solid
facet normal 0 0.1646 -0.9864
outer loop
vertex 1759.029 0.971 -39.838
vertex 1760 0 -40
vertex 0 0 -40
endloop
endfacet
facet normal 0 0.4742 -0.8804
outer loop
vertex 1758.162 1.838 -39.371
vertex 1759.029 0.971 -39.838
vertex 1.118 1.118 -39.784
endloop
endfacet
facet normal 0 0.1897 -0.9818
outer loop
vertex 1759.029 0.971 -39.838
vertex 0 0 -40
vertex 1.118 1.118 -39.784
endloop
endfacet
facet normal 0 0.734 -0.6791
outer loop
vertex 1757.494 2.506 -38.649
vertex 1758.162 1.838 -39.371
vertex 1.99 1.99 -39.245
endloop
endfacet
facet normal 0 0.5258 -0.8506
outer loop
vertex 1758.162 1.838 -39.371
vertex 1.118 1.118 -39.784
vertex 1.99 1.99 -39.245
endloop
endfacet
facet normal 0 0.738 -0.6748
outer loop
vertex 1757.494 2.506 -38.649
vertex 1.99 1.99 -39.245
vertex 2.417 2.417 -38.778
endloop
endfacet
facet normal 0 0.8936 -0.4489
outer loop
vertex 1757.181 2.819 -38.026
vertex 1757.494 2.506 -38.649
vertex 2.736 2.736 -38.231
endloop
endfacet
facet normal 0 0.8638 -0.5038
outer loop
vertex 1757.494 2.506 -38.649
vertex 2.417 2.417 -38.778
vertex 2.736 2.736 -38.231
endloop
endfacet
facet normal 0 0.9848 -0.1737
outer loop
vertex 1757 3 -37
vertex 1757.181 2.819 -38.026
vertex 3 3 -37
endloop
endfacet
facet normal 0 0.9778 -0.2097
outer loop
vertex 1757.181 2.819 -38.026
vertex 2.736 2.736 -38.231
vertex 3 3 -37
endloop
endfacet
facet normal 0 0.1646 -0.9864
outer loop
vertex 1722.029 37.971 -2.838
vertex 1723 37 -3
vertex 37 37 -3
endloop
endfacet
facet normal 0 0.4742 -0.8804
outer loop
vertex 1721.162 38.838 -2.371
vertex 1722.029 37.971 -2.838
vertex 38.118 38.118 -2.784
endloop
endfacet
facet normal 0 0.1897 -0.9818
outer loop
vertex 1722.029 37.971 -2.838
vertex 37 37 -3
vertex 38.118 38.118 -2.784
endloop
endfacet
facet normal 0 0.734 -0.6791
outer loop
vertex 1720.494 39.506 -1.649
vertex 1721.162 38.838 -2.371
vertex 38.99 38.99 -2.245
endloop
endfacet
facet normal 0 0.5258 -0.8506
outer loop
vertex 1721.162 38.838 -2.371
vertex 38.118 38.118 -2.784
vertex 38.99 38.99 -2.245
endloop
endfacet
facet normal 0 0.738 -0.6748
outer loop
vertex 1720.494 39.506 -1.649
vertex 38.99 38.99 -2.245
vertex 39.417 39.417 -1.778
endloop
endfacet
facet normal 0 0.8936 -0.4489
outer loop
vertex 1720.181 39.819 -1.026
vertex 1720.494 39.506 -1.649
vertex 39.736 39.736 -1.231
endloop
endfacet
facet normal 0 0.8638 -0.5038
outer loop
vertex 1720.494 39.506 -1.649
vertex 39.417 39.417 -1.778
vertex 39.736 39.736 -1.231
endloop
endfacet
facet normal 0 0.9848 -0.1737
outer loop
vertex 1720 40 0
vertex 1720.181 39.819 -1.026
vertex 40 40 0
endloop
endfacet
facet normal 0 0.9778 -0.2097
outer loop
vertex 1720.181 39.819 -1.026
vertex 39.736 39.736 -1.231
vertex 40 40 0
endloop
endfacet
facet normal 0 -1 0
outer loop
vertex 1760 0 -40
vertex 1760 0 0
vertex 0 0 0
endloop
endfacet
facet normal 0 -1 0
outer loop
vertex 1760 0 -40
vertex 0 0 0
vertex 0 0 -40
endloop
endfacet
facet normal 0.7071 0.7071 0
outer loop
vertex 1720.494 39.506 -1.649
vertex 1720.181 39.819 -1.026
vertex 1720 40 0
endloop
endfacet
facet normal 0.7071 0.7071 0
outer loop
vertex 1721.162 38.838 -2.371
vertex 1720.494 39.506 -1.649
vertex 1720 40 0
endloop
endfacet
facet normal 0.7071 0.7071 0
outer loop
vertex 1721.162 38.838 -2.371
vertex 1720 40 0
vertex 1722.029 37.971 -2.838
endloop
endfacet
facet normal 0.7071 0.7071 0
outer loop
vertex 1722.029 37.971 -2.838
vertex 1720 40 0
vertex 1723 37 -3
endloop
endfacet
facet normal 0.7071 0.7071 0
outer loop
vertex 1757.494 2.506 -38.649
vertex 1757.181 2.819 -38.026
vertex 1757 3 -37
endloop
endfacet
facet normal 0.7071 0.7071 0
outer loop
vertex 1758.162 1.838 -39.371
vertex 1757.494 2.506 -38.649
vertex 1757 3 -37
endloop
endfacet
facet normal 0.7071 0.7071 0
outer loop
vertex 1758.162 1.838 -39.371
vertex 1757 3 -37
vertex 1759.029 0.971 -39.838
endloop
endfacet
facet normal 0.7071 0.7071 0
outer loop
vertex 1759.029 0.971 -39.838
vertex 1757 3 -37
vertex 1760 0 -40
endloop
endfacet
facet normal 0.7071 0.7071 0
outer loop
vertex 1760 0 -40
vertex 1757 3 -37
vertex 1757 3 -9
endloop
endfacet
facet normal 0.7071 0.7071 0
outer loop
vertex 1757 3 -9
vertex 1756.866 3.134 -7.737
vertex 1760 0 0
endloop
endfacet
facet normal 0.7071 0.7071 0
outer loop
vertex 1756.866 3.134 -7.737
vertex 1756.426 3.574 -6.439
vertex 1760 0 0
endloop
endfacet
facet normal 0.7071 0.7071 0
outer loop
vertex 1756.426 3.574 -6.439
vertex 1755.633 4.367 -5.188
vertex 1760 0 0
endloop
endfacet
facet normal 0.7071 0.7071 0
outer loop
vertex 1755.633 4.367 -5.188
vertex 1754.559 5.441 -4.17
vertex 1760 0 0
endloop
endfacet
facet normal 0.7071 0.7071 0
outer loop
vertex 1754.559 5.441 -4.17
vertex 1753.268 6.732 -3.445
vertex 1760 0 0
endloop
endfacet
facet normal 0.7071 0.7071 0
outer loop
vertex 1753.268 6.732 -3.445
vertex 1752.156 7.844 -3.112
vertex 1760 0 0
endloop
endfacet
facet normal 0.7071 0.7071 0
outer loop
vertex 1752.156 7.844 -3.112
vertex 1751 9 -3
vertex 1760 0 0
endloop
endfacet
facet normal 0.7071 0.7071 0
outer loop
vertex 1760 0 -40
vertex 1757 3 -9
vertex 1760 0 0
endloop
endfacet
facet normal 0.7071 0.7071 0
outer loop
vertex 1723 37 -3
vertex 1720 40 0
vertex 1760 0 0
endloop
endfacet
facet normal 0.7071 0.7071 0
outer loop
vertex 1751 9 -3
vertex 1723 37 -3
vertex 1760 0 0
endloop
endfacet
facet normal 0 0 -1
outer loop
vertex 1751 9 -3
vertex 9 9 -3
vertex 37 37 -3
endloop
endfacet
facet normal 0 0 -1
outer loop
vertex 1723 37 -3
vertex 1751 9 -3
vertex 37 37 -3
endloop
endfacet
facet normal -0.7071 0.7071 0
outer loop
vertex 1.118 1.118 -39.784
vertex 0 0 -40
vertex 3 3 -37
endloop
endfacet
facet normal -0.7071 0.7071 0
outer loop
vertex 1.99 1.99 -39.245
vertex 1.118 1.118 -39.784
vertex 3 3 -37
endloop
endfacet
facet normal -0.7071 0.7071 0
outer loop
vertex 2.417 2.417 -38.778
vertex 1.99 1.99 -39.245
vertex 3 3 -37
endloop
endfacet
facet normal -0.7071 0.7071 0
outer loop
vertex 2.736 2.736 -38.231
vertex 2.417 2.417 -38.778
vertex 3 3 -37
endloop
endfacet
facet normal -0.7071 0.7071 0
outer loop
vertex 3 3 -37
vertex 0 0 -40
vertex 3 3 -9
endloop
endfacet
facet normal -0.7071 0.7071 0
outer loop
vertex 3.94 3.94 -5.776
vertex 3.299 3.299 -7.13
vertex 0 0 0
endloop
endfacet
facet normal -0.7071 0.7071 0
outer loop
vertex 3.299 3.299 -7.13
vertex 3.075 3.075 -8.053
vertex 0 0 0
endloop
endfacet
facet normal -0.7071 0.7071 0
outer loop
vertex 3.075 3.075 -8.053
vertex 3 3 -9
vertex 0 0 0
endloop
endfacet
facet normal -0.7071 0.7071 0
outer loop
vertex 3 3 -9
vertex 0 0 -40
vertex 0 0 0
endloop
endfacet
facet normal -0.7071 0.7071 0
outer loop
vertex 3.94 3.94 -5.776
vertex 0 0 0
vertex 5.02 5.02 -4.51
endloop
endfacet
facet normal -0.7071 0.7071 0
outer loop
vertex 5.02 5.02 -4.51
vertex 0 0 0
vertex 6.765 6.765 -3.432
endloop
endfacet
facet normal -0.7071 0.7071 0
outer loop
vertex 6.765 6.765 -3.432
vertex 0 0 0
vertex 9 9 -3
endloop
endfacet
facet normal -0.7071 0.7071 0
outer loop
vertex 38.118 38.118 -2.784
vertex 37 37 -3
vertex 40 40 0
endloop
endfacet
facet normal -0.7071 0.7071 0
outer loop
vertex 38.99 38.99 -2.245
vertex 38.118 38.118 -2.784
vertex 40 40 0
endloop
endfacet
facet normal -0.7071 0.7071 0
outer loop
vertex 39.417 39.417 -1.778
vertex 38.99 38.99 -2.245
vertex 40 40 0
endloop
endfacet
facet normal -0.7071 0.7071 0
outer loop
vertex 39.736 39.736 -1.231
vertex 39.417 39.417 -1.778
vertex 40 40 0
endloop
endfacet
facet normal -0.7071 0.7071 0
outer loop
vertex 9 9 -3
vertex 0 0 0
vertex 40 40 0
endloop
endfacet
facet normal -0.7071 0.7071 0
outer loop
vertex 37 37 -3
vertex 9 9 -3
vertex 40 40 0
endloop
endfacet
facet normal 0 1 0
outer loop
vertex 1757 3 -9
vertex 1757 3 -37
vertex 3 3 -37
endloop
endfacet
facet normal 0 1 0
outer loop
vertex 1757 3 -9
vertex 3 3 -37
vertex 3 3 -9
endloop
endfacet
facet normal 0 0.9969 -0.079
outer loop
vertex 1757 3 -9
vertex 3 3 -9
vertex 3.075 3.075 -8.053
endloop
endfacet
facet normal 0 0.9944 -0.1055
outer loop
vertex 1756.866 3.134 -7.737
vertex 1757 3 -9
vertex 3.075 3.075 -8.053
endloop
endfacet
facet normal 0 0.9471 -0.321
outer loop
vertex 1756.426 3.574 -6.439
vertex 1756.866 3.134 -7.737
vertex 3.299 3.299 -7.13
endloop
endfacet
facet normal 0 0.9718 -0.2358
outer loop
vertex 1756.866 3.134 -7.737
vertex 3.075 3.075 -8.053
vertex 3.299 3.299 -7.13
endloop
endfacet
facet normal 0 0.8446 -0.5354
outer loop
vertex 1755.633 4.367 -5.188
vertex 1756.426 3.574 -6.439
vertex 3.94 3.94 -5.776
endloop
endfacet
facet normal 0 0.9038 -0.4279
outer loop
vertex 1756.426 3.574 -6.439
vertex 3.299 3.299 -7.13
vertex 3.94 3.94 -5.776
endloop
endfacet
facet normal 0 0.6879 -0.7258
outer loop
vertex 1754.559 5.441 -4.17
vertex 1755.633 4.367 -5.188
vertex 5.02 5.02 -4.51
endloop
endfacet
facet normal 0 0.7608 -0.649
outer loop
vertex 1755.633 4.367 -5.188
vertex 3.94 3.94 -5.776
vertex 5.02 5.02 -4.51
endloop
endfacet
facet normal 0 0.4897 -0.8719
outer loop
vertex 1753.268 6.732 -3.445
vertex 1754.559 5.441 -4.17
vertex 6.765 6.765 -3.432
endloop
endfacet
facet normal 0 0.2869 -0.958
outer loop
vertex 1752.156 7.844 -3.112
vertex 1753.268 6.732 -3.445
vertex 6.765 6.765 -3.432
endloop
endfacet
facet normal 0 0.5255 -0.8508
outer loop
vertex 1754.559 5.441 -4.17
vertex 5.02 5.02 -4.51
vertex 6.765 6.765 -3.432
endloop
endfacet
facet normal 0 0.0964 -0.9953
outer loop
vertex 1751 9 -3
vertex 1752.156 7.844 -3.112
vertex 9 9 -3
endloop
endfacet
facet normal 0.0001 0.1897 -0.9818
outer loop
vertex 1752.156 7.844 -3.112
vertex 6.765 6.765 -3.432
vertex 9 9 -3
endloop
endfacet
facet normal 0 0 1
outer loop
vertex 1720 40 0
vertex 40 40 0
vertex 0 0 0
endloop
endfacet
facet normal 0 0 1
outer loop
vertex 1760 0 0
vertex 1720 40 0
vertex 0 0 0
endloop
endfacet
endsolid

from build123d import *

# Parameters (mm, degrees)
L_ANGLE_EQUAL_40X40X3_7_DEPTH = 1760
CUT_EXTRUDE1_DEPTH            = 1761.908856244


with BuildPart() as part:
    # Sketch13 → L angle (equal) 40X40X3(7) (new body)
    with BuildSketch(Plane(origin=(0, 0, 0), x_dir=(0, 0, -1), z_dir=(1, 0, 0))):
        with BuildLine():
            Line((0, 40), (0, 0))
            Line((0, 0), (40, 0))
            ThreePointArc((40, 0), (39.121320344, 2.121320344), (37, 3))
            Line((37, 3), (9, 3))
            ThreePointArc((9, 3), (4.757359313, 4.757359313), (3, 9))
            Line((3, 9), (3, 37))
            ThreePointArc((3, 37), (2.121320344, 39.121320344), (0, 40))
        make_face()
    extrude(amount=L_ANGLE_EQUAL_40X40X3_7_DEPTH)

    # Sketch14 → Cut-Extrude1 (cut, through all)
    with BuildSketch(Plane.XY):
        Polygon((1760, 0), (1760, 40), (1720, 40), align=None)
        Polygon((0, 40), (0, 0), (40, 40), align=None)
    extrude(amount=-CUT_EXTRUDE1_DEPTH, mode=Mode.SUBTRACT)


solid = part.part
